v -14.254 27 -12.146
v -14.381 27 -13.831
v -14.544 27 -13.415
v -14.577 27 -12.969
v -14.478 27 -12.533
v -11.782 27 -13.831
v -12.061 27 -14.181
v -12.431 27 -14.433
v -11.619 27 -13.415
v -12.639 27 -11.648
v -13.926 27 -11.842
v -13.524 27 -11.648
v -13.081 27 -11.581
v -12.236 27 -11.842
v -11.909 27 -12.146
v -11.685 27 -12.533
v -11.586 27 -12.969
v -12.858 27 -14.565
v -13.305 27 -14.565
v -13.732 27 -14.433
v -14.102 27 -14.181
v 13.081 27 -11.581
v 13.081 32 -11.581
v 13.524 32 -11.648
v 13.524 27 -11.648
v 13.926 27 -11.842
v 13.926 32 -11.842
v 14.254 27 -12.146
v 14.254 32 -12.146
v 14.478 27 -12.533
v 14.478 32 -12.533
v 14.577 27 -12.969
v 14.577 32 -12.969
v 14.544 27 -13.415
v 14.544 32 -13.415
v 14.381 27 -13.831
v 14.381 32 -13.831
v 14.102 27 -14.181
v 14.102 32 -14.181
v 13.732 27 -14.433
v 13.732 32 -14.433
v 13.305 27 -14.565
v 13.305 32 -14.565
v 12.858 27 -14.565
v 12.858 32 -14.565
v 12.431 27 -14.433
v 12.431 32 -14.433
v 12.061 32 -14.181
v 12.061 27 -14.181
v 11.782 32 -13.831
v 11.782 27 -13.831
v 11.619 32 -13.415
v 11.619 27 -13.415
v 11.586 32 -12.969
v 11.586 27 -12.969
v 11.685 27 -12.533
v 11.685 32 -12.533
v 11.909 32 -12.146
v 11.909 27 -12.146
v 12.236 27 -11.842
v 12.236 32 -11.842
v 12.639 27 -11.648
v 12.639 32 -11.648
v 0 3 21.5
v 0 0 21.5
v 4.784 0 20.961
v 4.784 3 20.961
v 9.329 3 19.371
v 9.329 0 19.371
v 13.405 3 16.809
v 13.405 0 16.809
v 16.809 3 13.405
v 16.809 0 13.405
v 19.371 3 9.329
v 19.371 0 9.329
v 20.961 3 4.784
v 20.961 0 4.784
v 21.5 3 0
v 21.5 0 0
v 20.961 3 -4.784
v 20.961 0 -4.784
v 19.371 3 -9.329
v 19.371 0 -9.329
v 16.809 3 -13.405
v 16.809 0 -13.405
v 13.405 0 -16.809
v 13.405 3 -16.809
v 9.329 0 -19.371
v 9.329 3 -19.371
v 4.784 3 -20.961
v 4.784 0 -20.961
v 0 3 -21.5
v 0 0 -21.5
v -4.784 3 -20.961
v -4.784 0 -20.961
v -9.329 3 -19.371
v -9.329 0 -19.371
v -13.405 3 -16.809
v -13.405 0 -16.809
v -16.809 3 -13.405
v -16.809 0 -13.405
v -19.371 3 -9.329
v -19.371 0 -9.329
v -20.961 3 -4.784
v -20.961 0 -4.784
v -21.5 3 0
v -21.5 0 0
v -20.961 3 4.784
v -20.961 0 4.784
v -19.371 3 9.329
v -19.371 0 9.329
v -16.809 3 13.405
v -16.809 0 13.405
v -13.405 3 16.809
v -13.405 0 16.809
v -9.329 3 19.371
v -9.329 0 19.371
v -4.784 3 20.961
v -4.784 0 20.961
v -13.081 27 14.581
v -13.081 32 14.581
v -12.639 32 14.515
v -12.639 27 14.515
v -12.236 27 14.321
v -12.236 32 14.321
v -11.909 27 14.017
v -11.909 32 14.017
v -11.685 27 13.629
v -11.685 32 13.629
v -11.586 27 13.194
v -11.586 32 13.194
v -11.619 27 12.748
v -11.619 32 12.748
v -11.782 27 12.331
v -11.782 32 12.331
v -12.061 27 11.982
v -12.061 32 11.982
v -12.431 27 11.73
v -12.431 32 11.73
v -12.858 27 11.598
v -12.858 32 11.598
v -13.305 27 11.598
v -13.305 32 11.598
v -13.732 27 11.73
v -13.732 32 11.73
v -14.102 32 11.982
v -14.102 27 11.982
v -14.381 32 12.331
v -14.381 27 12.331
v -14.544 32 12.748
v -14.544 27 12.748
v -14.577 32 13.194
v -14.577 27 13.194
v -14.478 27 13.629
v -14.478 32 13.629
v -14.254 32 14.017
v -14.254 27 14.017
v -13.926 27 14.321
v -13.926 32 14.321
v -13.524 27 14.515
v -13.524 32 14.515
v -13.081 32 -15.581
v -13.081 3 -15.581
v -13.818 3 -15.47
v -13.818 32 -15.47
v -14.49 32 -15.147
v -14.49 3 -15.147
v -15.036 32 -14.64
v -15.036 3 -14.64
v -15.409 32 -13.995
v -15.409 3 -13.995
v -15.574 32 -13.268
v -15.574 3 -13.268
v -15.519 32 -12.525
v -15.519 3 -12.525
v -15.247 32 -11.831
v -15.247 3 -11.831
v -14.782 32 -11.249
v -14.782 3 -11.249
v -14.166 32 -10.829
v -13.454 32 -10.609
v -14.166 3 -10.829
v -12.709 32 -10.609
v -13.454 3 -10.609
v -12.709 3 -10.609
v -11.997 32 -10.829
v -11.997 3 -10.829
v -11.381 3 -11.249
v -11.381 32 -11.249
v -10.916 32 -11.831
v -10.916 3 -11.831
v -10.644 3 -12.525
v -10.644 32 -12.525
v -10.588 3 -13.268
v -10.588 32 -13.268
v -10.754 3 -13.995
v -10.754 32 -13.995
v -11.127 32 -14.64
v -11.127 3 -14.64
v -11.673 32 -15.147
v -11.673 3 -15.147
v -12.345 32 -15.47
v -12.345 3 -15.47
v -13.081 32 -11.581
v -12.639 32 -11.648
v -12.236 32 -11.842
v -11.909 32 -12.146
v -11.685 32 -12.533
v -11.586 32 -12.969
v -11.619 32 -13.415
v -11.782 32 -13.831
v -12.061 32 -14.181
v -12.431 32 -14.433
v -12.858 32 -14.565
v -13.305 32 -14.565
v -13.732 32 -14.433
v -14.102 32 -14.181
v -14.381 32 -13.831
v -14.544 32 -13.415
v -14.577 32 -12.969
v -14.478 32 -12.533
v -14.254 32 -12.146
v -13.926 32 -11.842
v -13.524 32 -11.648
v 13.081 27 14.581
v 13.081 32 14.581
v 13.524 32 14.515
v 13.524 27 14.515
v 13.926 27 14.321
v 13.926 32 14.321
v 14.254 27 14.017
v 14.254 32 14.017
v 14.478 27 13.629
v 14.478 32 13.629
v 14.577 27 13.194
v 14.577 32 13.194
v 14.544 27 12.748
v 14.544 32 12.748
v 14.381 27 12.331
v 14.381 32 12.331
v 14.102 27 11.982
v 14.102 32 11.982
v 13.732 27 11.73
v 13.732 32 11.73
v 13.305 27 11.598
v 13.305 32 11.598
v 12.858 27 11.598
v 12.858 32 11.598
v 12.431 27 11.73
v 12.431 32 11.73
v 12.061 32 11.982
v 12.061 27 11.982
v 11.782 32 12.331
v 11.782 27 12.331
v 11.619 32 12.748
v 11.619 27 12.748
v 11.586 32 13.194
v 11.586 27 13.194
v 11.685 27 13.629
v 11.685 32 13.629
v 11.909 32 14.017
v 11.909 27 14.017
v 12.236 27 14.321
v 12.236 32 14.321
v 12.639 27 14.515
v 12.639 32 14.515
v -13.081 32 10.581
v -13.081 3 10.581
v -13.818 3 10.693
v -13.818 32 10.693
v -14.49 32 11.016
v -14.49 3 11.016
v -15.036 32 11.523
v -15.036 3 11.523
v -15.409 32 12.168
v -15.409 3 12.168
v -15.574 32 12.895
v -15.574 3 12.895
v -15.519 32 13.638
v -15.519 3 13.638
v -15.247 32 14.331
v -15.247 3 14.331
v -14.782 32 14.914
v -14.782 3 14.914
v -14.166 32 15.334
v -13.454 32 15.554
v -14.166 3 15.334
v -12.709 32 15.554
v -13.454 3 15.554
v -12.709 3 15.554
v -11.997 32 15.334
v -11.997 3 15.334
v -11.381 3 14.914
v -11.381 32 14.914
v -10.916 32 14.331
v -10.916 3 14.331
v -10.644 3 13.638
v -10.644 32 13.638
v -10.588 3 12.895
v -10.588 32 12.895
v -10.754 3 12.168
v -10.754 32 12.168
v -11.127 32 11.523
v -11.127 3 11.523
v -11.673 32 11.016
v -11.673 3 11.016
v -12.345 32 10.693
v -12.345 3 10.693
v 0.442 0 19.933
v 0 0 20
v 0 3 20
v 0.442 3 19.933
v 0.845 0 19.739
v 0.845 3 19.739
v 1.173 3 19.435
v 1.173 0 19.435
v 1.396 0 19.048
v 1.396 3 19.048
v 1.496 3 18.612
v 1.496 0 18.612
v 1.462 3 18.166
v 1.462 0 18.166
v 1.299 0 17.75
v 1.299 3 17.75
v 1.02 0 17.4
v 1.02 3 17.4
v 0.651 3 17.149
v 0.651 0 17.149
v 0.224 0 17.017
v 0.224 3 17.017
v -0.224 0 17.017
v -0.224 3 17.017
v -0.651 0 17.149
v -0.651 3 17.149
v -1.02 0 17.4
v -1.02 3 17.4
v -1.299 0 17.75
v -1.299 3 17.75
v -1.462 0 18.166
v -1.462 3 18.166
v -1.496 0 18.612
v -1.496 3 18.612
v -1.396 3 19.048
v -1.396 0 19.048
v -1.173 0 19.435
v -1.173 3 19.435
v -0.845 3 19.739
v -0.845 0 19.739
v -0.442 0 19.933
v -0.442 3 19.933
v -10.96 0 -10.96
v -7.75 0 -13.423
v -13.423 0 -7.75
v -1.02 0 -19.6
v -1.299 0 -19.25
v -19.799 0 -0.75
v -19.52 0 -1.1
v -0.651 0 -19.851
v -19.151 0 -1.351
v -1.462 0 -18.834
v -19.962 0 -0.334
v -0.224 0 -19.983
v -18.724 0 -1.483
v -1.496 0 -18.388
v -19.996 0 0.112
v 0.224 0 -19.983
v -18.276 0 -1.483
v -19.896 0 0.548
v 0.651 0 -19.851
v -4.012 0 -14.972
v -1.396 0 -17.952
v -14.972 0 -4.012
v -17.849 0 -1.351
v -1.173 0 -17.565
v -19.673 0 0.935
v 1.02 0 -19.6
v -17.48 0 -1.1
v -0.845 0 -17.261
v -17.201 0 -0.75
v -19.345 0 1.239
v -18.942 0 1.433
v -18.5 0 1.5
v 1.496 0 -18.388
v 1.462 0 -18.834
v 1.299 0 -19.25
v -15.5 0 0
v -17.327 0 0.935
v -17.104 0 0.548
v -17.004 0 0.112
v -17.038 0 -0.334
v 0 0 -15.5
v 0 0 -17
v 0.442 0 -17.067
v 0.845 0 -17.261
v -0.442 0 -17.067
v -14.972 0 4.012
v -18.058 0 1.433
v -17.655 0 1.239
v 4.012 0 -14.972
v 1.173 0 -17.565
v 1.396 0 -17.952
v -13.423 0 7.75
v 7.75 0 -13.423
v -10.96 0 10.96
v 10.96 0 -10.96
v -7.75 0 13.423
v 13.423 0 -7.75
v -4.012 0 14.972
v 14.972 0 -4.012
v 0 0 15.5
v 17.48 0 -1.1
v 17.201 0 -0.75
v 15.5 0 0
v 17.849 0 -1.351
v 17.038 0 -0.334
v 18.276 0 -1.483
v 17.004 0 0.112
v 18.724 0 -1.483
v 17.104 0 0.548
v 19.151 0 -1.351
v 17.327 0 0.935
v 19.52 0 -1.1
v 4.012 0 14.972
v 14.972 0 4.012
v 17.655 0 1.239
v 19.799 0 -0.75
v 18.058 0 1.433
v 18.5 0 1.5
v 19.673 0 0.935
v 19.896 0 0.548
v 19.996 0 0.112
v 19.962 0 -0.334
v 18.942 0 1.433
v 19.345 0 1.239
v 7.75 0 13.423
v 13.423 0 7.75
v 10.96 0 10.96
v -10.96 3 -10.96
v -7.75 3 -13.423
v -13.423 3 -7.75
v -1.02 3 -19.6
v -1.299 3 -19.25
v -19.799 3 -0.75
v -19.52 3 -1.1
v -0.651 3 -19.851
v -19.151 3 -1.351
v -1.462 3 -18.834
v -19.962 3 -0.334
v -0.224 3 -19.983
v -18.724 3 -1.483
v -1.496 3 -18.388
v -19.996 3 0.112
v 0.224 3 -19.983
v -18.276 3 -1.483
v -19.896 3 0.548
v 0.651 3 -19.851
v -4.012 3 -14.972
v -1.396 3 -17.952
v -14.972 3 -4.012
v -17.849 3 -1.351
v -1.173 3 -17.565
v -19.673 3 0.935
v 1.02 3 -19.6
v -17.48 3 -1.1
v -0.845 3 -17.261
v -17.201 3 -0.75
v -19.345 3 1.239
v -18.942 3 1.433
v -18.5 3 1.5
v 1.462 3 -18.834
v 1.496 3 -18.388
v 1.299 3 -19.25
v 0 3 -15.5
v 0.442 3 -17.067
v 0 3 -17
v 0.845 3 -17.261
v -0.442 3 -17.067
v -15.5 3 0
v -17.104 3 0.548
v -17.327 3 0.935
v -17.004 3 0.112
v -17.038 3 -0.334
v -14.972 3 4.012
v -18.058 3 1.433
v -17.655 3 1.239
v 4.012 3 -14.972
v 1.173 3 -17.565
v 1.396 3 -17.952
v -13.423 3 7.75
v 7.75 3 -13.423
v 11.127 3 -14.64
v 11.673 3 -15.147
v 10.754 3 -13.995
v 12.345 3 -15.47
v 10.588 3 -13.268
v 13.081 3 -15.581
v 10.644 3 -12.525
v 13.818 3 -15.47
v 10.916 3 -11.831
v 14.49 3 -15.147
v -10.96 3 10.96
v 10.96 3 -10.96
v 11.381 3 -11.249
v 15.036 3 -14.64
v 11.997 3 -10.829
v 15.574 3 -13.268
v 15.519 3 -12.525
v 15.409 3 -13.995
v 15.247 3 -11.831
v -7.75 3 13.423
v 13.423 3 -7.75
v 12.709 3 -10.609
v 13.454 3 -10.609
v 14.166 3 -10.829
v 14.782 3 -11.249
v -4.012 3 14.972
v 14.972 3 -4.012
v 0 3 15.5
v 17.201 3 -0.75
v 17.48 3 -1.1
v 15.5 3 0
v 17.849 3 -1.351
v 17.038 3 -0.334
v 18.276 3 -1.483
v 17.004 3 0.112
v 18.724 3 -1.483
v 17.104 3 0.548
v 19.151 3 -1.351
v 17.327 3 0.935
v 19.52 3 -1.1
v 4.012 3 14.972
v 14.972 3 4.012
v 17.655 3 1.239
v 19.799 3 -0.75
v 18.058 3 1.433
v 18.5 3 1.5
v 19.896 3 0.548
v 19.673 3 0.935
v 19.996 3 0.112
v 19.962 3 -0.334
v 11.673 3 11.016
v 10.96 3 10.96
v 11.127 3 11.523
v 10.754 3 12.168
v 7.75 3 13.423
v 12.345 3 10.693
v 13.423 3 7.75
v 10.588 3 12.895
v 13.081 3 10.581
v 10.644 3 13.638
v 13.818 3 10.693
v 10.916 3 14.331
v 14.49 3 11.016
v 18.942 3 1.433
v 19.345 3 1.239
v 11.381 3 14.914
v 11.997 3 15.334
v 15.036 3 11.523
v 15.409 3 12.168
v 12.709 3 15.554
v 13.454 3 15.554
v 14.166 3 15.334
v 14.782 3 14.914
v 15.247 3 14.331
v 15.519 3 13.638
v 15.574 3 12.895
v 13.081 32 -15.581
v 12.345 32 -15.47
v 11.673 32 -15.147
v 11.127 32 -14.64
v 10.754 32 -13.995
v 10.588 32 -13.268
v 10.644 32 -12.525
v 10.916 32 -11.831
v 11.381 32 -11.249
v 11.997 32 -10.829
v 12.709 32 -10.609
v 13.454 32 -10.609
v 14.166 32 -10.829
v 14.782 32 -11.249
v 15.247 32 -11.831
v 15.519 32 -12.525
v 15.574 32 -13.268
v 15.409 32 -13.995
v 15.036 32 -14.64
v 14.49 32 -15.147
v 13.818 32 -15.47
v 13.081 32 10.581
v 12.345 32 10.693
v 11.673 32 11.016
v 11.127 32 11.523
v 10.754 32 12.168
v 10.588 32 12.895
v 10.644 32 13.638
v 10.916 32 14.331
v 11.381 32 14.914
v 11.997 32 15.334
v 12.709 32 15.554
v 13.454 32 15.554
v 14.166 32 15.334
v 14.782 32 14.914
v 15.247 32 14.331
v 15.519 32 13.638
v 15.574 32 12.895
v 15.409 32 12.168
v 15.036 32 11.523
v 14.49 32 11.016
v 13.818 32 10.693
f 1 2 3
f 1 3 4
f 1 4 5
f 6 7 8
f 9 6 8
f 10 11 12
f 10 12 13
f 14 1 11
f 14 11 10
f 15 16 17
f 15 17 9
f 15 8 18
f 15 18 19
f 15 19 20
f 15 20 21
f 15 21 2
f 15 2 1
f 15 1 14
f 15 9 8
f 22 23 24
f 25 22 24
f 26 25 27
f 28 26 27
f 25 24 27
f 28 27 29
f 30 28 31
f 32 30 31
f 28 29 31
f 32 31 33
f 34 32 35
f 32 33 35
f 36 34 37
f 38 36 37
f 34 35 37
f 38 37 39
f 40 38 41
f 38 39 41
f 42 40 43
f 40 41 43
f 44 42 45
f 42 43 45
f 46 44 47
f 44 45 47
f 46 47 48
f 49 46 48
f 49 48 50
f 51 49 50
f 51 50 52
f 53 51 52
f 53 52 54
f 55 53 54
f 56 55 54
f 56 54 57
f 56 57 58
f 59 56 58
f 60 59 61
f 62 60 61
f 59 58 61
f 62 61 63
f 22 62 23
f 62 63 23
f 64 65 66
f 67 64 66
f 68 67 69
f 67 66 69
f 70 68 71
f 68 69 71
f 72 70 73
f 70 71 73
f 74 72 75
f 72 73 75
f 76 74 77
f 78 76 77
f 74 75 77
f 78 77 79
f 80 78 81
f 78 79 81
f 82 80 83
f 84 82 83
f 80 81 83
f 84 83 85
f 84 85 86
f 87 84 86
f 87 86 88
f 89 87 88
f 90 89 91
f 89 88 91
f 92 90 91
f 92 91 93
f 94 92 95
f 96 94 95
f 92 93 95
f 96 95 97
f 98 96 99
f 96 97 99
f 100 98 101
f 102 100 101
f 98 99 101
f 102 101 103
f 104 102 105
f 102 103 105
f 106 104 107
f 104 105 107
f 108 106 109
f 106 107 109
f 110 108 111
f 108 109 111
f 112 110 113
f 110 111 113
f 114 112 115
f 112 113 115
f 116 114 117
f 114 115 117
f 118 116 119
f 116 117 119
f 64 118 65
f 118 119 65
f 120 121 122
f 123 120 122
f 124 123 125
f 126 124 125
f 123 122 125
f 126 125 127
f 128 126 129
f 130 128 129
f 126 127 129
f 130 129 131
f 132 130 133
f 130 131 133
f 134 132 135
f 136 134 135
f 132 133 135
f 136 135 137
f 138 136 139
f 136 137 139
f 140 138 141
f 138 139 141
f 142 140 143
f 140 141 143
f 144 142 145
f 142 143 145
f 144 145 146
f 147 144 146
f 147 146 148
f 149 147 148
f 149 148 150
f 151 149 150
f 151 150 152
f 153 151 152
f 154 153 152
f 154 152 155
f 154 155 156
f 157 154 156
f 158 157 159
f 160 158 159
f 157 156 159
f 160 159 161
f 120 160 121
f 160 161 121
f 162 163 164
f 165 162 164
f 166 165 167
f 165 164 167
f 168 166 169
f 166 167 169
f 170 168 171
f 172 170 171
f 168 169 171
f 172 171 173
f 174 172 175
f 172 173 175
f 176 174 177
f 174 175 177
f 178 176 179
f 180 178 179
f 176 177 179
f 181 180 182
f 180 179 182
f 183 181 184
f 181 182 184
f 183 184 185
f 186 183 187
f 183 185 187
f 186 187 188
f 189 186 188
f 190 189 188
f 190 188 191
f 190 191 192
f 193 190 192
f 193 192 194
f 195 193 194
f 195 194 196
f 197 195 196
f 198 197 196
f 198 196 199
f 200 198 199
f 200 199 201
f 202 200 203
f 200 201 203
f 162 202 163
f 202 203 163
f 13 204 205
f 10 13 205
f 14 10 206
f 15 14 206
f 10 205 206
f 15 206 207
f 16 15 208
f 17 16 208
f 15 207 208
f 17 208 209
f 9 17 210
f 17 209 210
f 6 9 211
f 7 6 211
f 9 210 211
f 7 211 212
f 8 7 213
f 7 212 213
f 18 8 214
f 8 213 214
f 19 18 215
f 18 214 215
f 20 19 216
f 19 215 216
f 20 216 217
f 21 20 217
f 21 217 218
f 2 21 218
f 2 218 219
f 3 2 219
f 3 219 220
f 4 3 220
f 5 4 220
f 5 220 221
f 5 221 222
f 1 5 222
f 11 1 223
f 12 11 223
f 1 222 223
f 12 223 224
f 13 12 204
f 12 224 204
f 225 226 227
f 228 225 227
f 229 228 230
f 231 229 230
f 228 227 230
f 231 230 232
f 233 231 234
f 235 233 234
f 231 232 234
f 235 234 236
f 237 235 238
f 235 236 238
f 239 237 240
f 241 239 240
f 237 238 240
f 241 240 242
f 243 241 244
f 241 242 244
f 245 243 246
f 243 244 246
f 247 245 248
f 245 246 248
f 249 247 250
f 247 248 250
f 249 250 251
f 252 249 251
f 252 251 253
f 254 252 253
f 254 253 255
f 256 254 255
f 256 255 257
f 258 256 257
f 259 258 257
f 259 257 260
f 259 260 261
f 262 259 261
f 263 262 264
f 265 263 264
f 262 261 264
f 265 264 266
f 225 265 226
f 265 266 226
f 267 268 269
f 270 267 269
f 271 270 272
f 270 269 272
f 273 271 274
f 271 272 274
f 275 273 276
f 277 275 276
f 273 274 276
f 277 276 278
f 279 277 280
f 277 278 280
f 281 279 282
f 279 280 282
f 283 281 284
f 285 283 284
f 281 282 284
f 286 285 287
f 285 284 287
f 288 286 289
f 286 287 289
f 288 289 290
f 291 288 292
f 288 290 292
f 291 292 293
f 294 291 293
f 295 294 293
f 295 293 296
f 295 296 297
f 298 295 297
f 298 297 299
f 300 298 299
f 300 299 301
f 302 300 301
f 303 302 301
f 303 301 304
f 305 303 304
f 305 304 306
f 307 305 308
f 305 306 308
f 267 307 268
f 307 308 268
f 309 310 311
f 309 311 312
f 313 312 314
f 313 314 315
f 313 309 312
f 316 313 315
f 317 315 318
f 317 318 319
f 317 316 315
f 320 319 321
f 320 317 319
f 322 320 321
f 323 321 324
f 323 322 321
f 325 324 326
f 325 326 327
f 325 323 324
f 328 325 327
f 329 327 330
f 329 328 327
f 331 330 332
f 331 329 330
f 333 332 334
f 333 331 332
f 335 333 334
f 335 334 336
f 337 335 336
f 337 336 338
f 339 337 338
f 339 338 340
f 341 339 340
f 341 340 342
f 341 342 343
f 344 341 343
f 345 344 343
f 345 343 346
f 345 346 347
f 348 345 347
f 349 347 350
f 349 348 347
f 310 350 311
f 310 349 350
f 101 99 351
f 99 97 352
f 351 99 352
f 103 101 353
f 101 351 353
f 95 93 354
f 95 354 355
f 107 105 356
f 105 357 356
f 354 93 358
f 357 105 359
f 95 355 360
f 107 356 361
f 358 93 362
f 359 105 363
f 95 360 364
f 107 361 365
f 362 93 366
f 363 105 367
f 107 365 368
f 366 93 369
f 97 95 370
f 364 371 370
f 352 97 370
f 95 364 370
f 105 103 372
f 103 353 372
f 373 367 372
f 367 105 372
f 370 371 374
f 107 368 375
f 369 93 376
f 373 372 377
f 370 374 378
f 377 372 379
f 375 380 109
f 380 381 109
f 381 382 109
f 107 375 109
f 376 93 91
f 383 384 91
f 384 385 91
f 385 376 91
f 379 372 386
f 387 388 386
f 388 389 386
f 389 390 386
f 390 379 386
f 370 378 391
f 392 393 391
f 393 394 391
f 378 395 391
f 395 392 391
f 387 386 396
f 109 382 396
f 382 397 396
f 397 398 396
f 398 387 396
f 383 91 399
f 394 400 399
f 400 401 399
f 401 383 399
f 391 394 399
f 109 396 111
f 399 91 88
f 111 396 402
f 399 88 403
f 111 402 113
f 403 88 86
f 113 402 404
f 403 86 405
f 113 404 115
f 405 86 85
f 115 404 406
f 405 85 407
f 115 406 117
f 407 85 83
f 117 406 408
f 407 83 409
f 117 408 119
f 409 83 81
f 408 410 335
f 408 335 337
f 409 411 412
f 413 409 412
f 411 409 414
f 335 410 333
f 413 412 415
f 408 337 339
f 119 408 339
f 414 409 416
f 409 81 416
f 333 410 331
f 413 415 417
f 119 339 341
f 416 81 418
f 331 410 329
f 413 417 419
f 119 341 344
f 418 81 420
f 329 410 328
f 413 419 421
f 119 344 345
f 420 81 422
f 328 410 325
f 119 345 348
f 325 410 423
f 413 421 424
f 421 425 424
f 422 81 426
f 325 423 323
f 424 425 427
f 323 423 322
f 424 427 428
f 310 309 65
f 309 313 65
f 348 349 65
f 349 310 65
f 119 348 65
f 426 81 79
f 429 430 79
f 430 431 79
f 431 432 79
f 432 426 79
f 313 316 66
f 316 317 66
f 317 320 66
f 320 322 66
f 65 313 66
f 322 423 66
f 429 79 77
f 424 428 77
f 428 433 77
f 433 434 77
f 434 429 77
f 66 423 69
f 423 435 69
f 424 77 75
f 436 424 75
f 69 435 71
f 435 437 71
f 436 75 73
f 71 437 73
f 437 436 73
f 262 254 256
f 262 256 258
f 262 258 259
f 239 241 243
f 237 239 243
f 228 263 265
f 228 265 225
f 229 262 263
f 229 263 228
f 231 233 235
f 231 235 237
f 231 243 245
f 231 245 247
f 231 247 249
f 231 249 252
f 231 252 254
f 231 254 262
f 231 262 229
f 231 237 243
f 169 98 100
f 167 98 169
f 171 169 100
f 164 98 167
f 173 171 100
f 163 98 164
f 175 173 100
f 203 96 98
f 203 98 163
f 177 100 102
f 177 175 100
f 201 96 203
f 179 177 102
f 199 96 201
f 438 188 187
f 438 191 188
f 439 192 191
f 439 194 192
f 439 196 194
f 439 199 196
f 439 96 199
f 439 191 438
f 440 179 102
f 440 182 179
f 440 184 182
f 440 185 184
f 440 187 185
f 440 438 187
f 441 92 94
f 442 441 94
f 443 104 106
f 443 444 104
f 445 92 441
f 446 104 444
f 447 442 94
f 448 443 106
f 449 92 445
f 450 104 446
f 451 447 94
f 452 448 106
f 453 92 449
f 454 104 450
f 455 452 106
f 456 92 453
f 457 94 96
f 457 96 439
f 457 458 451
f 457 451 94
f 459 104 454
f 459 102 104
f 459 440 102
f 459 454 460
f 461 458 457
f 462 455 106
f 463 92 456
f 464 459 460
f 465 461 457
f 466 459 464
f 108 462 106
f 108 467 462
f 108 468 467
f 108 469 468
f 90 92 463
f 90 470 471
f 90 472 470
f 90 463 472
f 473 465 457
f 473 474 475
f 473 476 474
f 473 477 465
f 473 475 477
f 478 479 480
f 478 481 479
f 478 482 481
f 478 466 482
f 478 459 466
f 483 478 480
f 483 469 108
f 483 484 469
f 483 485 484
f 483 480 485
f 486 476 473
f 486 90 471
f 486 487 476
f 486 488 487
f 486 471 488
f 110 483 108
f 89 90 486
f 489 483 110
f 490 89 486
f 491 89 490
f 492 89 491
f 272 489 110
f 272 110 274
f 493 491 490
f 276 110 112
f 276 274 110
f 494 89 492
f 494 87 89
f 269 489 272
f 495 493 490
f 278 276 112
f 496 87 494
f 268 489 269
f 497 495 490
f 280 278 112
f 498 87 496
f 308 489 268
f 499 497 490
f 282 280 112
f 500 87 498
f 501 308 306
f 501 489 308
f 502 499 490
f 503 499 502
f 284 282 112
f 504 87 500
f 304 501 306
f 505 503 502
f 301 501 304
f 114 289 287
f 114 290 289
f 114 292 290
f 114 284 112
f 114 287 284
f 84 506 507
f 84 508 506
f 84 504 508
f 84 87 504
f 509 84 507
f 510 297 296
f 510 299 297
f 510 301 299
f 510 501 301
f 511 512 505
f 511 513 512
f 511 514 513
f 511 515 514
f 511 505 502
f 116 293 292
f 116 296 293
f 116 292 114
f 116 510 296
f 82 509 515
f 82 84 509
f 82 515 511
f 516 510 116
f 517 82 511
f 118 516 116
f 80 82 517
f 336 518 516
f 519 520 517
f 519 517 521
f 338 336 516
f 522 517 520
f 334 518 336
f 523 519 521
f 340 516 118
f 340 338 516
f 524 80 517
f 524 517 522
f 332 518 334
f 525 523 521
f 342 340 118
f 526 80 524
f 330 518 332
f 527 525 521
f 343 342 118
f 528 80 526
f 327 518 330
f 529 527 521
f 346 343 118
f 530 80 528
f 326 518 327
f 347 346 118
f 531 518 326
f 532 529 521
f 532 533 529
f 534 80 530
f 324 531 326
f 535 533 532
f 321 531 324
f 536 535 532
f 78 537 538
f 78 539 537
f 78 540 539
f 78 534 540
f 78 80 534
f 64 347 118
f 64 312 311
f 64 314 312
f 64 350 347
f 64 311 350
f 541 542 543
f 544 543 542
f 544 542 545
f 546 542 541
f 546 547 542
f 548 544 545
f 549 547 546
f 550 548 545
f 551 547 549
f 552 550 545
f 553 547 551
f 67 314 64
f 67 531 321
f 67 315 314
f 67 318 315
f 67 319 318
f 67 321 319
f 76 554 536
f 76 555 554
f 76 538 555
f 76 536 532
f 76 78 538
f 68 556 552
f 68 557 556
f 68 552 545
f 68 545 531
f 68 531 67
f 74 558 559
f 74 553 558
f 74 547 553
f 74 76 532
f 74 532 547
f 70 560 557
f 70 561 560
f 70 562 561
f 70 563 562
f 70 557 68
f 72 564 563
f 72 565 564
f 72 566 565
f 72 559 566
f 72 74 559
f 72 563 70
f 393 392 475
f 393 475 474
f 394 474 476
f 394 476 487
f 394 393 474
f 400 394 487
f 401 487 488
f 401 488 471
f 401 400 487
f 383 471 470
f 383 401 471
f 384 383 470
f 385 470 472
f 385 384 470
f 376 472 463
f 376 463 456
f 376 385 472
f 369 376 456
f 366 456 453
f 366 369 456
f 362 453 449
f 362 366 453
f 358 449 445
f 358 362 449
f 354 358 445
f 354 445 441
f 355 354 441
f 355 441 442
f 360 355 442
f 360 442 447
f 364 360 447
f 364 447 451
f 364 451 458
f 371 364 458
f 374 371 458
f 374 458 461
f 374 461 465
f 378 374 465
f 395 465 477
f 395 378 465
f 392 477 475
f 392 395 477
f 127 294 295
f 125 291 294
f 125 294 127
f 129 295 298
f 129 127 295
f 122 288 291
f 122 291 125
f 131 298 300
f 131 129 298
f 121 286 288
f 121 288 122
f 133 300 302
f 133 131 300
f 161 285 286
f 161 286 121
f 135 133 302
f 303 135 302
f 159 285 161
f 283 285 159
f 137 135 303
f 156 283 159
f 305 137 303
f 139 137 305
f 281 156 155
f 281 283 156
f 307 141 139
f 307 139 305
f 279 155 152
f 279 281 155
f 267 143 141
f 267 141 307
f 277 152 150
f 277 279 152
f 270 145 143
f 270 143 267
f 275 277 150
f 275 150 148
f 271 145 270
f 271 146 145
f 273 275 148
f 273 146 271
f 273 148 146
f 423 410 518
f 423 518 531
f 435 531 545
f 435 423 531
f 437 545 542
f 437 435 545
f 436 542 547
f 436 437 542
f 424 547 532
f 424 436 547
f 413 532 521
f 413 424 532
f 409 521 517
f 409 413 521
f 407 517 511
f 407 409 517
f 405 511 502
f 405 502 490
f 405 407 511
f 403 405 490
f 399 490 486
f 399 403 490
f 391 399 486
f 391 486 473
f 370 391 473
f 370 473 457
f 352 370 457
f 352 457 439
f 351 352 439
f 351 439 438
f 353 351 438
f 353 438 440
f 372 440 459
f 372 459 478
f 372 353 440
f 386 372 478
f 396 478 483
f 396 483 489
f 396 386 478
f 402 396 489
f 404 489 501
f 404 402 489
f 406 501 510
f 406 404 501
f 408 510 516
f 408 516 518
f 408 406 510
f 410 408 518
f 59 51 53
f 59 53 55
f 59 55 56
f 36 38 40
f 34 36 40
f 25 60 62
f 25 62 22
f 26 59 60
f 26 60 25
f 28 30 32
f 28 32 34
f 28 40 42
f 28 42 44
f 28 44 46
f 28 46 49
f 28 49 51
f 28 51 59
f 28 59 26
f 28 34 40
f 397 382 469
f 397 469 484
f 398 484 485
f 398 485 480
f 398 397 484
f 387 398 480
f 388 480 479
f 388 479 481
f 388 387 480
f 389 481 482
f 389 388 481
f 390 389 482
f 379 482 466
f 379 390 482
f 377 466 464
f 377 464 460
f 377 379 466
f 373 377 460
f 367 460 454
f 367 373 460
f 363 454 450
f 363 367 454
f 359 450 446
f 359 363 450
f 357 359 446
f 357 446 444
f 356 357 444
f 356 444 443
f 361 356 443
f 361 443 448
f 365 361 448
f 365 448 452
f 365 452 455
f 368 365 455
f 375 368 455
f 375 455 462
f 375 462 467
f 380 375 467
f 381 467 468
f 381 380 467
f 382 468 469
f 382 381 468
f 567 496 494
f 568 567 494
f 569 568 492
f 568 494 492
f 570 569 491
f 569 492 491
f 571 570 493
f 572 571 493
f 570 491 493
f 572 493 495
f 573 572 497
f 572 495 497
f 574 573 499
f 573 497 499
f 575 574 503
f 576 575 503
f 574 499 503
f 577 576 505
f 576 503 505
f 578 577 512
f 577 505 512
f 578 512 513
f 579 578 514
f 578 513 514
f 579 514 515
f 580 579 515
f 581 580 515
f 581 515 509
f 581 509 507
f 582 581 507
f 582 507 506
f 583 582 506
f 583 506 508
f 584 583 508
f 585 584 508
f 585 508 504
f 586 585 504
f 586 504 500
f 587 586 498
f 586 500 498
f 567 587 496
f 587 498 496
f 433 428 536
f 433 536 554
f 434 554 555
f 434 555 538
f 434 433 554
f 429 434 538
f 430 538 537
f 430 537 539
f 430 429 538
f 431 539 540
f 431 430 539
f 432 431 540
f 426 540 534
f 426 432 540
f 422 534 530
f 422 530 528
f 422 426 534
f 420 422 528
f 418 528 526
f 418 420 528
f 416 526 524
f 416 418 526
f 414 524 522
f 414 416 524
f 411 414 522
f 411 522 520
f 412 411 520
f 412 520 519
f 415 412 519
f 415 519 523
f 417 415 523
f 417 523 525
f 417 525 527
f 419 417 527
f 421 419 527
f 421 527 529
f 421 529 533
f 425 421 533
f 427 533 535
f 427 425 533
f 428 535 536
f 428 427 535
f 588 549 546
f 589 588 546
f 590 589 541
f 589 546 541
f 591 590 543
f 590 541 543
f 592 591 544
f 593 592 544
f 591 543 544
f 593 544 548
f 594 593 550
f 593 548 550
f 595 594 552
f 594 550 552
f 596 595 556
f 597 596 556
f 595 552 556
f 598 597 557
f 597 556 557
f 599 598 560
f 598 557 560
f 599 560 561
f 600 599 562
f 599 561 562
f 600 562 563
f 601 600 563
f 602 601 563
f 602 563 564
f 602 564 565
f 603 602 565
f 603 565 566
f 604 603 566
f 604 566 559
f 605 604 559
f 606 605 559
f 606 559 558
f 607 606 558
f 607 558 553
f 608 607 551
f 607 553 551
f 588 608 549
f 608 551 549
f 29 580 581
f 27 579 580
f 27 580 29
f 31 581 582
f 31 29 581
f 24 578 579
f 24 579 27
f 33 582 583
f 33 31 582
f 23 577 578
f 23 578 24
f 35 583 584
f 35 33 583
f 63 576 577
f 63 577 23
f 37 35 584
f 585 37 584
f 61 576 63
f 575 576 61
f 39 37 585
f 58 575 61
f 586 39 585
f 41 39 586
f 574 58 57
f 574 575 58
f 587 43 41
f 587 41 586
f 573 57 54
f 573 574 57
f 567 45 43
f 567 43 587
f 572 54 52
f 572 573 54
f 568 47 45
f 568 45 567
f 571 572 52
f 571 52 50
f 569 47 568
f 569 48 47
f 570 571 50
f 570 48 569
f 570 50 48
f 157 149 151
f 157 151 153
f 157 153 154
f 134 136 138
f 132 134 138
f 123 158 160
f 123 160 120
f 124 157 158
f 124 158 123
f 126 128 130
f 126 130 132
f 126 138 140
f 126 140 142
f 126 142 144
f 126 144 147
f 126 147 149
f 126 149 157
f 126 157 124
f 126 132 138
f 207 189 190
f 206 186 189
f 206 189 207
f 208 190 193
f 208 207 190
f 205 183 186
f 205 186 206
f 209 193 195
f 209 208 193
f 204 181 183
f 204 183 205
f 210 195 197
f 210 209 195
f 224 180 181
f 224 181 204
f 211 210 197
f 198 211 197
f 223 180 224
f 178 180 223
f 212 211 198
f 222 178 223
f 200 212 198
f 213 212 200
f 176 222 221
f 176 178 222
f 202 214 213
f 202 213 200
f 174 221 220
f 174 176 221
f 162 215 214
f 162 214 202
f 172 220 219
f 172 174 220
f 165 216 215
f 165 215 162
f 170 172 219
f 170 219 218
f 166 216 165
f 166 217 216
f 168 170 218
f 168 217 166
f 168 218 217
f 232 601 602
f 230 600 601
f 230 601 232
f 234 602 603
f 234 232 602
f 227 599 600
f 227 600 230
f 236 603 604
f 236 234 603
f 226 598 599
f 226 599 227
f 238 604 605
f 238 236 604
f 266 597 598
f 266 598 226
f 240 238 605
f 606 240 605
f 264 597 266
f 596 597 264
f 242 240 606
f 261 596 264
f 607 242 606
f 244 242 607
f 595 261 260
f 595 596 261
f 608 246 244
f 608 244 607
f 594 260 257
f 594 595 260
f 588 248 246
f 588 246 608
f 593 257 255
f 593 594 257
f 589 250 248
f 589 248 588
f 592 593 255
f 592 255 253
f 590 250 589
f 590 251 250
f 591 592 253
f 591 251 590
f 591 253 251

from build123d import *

# Parameters (mm, degrees)
SKETCH1_R           = 21.5
SKETCH1_R_2         = 15.5
SKETCH1_R_3         = 1.5
BOSS_EXTRUDE1_DEPTH = 3
SKETCH2_R           = 2.5
BOSS_EXTRUDE2_DEPTH = 29
SKETCH3_R           = 1.5
CUT_EXTRUDE1_DEPTH  = 5


with BuildPart() as part:
    # Sketch1 → Boss-Extrude1 (new body)
    with BuildSketch(Plane(origin=(0, 0, 0), x_dir=(1, 0, 0), z_dir=(0, 1, 0))):
        with Locations(Location((0, 0, 0), (0, 0, 270))):
            Circle(SKETCH1_R)
        with Locations(Location((0, 0, 0), (0, 0, 270))):
            Circle(SKETCH1_R_2, mode=Mode.SUBTRACT)
        with Locations(Location((0, 18.5, 0), (0, 0, 270))):
            Circle(SKETCH1_R_3, mode=Mode.SUBTRACT)
        with Locations(Location((18.5, 0, 0), (0, 0, 270))):
            Circle(SKETCH1_R_3, mode=Mode.SUBTRACT)
        with Locations(Location((0, -18.5, 0), (0, 0, 270))):
            Circle(SKETCH1_R_3, mode=Mode.SUBTRACT)
        with Locations(Location((-18.5, 0, 0), (0, 0, 270))):
            Circle(SKETCH1_R_3, mode=Mode.SUBTRACT)
    extrude(amount=BOSS_EXTRUDE1_DEPTH)

    # Sketch2 → Boss-Extrude2 (add)
    with BuildSketch(Plane(origin=(0, 3, 0), x_dir=(1, 0, 0), z_dir=(0, 1, 0))):
        with Locations(Location((-13.081475452, 13.081475452, 0), (0, 0, 90))):
            Circle(SKETCH2_R)
        with Locations(Location((13.081475452, 13.081475452, 0), (0, 0, 90))):
            Circle(SKETCH2_R)
        with Locations(Location((13.081475452, -13.081475452, 0), (0, 0, 90))):
            Circle(SKETCH2_R)
        with Locations(Location((-13.081475452, -13.081475452, 0), (0, 0, 90))):
            Circle(SKETCH2_R)
    extrude(amount=BOSS_EXTRUDE2_DEPTH)

    # Sketch3 → Cut-Extrude1 (cut)
    with BuildSketch(Plane(origin=(0, 32, 0), x_dir=(1, 0, 0), z_dir=(0, 1, 0))):
        with Locations(Location((-13.081475452, 13.081475452, 0), (0, 0, 270))):
            Circle(SKETCH3_R)
        with Locations(Location((13.081475452, 13.081475452, 0), (0, 0, 270))):
            Circle(SKETCH3_R)
        with Locations(Location((13.081475452, -13.081475452, 0), (0, 0, 270))):
            Circle(SKETCH3_R)
        with Locations(Location((-13.081475452, -13.081475452, 0), (0, 0, 270))):
            Circle(SKETCH3_R)
    extrude(amount=-CUT_EXTRUDE1_DEPTH, mode=Mode.SUBTRACT)


solid = part.part
